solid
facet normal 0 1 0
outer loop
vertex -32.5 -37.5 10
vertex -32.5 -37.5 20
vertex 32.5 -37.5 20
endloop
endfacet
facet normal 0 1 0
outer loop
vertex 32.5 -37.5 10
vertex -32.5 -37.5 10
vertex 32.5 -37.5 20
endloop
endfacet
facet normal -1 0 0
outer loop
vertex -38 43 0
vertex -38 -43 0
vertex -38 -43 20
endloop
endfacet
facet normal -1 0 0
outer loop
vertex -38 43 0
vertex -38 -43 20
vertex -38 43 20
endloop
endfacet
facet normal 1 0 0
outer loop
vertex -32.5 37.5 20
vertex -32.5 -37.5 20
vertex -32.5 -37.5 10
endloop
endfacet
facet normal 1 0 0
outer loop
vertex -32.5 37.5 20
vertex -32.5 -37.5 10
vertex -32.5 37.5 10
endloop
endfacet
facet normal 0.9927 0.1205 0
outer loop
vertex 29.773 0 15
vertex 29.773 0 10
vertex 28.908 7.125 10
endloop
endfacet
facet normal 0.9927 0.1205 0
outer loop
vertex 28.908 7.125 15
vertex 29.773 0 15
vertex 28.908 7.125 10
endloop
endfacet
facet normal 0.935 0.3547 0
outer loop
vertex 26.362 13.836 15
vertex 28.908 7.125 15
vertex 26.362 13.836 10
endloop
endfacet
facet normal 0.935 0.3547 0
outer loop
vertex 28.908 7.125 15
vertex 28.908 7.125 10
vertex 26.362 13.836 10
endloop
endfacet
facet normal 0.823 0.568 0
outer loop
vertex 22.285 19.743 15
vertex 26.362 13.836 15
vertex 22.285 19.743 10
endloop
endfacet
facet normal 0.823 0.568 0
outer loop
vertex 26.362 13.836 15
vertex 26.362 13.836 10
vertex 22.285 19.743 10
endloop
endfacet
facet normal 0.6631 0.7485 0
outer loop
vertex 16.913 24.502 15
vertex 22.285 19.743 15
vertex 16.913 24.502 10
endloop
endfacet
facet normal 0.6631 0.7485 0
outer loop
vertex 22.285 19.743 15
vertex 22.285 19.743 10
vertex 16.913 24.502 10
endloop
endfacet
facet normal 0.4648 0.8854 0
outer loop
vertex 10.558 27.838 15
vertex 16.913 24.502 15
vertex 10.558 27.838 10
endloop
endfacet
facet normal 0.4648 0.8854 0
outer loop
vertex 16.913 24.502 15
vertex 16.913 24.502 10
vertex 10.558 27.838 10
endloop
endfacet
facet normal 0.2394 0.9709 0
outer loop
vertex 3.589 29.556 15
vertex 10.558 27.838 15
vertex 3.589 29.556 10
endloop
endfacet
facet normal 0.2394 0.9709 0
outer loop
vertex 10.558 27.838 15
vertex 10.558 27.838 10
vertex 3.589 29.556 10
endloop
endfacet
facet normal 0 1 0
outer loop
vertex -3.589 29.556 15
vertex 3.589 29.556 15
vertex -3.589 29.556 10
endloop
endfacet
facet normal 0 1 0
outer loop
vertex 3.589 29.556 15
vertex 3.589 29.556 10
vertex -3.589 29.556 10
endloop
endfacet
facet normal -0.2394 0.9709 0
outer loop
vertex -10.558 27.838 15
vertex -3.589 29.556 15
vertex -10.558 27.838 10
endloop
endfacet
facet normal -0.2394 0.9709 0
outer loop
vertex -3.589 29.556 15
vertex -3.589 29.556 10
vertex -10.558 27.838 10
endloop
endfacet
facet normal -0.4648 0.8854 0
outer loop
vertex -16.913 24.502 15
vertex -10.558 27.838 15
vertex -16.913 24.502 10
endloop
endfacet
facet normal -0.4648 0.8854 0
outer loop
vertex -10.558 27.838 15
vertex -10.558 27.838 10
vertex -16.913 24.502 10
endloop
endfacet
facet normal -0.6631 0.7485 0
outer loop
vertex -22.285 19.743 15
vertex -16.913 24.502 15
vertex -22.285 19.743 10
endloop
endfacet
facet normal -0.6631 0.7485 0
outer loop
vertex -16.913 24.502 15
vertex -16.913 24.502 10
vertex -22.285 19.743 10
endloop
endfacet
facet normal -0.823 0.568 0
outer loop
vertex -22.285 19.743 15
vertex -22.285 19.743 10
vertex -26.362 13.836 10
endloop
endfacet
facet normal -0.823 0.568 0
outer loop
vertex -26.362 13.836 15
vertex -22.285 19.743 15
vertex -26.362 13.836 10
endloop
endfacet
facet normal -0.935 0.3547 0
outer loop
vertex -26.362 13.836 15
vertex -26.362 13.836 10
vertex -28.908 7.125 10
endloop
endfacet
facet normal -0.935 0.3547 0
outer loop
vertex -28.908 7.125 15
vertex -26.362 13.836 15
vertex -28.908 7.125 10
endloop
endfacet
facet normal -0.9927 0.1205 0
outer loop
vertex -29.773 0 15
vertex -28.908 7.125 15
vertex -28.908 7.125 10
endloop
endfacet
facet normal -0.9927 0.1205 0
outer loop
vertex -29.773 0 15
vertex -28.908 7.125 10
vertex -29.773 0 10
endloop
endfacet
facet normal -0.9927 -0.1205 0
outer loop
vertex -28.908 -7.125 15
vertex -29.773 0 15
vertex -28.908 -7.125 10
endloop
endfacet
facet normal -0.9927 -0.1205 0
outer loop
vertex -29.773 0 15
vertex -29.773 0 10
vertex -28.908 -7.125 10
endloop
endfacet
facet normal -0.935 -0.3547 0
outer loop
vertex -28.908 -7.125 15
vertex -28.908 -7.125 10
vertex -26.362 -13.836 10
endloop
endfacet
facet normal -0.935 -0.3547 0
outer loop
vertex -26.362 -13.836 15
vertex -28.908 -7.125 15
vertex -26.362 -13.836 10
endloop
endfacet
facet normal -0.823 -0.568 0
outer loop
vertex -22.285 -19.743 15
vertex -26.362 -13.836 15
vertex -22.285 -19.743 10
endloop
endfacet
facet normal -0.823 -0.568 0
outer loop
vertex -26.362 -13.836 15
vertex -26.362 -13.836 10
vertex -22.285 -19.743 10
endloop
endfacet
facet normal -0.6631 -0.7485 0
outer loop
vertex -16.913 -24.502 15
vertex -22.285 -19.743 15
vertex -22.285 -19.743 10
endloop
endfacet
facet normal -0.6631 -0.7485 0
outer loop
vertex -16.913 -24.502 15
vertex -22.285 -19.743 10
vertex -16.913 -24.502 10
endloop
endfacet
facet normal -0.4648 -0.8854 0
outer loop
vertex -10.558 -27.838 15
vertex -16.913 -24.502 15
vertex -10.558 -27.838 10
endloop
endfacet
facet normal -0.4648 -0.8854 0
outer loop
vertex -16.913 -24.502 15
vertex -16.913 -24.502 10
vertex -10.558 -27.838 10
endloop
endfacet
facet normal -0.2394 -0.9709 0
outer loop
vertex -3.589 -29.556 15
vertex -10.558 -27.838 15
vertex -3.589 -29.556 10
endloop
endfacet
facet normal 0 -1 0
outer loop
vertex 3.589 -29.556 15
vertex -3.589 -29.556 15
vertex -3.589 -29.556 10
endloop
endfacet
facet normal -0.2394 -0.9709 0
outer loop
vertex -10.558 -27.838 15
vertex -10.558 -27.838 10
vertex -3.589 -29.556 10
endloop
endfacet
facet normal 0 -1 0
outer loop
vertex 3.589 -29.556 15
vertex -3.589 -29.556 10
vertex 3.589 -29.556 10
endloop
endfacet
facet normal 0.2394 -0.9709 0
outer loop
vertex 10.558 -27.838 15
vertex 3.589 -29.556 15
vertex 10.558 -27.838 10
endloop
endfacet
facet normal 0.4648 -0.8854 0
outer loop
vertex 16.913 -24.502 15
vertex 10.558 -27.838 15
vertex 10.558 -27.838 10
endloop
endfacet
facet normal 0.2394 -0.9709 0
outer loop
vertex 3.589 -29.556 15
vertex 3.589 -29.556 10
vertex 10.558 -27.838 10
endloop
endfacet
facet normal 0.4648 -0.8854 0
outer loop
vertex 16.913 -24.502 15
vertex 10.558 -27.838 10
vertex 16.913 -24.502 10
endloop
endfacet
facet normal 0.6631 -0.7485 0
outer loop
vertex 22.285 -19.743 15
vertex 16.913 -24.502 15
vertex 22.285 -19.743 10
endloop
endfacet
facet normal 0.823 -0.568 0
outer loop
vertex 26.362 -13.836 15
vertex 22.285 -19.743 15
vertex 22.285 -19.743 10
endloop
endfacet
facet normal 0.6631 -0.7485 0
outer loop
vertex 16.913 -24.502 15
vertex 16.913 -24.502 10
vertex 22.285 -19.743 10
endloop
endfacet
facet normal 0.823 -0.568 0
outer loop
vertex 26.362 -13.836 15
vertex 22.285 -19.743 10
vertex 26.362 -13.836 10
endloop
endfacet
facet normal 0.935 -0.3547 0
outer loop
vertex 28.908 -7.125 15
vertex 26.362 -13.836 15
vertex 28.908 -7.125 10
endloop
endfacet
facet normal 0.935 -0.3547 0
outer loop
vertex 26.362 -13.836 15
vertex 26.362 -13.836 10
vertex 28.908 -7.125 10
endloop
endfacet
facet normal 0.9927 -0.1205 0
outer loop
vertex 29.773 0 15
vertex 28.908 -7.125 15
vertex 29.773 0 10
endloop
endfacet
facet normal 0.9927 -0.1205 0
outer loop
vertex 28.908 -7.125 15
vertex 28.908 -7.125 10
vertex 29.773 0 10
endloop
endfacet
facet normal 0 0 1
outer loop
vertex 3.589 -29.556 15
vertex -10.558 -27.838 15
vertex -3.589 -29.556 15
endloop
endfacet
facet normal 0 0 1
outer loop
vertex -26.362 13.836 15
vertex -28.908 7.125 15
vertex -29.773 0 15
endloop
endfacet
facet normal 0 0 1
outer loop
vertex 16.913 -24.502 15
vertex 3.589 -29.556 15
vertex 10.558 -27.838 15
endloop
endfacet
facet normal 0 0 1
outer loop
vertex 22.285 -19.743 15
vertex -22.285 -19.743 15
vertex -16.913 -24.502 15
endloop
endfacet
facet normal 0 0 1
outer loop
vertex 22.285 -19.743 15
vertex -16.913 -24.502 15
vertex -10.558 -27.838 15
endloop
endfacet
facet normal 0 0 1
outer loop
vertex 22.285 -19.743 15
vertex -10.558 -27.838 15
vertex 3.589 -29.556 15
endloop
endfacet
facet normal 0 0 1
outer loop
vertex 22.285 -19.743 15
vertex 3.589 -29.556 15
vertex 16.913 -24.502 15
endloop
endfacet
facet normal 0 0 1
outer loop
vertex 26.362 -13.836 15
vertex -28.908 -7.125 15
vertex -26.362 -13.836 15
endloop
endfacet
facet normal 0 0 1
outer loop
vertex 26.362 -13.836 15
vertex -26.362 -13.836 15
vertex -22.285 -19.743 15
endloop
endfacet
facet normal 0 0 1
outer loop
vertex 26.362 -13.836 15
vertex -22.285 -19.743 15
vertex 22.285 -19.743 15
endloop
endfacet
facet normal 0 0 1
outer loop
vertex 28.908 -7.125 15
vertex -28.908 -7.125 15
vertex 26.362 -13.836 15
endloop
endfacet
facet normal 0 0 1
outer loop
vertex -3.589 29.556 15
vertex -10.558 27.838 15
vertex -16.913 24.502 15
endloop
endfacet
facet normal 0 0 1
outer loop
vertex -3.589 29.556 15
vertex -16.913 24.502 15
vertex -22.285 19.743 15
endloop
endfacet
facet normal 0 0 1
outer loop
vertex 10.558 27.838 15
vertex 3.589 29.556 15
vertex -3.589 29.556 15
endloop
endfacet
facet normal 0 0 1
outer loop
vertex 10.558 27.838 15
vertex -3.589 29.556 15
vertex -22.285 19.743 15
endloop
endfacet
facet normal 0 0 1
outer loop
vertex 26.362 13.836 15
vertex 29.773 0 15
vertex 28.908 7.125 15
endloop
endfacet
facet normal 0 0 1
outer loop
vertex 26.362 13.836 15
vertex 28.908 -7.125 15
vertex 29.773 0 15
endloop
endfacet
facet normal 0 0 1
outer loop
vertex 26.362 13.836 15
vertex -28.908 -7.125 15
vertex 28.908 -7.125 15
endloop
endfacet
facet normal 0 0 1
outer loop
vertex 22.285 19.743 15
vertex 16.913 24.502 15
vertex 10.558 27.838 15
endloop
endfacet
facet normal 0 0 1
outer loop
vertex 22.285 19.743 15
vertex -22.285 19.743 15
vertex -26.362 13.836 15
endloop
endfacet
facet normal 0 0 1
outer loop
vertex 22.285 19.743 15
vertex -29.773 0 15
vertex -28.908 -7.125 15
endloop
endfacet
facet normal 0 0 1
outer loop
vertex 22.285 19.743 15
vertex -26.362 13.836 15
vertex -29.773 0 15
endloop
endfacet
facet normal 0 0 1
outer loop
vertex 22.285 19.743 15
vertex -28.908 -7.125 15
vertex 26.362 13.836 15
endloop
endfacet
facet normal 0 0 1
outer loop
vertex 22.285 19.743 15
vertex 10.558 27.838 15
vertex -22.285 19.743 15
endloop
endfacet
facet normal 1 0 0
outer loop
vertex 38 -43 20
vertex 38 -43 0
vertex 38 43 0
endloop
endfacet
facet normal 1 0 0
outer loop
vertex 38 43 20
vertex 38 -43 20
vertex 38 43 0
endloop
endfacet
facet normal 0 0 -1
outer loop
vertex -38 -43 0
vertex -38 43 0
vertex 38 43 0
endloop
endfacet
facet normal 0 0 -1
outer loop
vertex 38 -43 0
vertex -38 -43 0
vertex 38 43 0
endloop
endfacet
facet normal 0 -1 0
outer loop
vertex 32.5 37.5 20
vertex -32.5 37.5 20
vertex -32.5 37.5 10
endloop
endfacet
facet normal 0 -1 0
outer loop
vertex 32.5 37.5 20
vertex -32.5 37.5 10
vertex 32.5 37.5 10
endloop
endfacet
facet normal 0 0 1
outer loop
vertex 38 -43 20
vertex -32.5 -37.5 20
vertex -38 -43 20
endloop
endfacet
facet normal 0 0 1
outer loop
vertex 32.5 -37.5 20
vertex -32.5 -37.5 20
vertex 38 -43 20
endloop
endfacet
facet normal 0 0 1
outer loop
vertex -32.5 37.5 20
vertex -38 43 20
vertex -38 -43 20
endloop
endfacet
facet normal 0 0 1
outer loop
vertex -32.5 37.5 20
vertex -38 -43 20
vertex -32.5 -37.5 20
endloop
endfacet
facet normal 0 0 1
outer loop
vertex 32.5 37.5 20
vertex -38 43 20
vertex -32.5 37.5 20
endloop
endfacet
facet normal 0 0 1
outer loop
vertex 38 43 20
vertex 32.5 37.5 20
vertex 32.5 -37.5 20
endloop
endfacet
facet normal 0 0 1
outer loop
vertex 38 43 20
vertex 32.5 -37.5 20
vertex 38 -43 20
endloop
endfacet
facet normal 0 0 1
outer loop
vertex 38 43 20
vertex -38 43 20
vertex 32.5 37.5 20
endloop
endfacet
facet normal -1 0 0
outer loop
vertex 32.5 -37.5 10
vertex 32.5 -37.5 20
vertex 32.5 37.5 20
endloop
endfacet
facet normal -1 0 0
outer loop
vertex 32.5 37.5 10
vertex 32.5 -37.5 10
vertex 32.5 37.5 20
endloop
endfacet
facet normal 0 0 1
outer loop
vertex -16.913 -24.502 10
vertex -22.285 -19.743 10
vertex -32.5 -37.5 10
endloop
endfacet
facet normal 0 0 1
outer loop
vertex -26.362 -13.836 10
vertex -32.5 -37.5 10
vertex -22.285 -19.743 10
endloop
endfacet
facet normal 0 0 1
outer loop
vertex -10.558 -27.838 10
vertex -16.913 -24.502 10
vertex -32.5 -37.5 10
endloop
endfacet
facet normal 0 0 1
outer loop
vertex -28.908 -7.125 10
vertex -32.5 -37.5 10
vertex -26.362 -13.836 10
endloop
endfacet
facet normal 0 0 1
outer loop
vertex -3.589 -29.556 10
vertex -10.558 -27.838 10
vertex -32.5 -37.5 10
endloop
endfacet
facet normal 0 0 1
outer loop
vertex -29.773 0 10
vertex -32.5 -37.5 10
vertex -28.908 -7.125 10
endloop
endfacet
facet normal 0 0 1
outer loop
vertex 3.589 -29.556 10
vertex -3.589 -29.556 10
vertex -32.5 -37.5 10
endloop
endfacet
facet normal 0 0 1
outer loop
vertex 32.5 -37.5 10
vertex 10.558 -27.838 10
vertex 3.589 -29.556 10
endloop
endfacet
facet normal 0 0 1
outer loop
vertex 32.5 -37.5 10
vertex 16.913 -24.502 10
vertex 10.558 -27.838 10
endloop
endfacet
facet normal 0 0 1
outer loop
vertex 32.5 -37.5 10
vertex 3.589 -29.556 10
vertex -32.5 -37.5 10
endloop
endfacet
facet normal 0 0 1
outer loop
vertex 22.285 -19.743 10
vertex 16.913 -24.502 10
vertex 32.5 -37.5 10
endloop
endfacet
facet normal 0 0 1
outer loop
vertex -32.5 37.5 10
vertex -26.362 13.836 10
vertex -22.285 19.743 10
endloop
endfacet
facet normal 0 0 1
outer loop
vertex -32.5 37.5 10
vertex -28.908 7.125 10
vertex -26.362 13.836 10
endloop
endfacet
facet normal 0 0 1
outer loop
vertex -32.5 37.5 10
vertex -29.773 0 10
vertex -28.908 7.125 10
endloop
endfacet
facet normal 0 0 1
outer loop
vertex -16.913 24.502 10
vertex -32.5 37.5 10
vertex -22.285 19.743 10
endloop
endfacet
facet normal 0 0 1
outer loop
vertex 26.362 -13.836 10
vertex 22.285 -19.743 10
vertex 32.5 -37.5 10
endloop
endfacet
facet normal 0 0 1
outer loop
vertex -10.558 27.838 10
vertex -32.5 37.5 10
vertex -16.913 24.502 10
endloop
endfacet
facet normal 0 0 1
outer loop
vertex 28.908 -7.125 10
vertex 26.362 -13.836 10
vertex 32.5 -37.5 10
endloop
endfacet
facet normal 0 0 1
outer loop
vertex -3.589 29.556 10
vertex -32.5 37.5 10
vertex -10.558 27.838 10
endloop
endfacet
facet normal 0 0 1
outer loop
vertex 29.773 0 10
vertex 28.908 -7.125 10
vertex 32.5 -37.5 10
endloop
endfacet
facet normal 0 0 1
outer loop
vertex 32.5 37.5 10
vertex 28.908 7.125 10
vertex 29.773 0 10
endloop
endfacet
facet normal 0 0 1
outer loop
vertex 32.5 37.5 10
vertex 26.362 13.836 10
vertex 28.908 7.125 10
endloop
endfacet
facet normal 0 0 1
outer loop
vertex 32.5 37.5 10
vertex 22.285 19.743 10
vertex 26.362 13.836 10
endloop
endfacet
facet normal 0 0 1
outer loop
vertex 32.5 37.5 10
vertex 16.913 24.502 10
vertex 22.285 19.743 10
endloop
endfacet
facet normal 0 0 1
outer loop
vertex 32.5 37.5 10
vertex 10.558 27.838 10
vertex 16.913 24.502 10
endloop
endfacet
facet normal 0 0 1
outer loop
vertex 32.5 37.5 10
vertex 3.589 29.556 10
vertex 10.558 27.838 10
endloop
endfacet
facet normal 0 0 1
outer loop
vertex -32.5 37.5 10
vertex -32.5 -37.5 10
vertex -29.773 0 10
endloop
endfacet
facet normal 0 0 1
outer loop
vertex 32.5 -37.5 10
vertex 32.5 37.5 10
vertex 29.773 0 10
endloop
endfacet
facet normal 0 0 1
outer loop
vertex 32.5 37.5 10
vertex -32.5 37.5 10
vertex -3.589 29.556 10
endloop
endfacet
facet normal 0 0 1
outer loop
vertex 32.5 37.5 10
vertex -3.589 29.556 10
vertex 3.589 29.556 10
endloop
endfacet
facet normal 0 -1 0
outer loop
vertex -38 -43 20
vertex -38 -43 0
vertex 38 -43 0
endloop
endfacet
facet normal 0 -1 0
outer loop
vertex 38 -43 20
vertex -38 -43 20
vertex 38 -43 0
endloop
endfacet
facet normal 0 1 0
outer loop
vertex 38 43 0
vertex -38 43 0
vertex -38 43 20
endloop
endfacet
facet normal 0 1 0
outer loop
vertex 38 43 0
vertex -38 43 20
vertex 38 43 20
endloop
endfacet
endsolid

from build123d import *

# Parameters (mm, degrees)
F0_W     = 76
F0_H     = 86
F1_DEPTH = 20
F2_W     = 65
F2_H     = 75
F3_DEPTH = 10
F4_R     = 29.772661
F5_DEPTH = 5


with BuildPart() as f1:
    # F0 (on Top) → F1 (new body)
    with BuildSketch(Plane.XY):
        Rectangle(F0_W, F0_H)
    extrude(amount=F1_DEPTH)

    # F2 (on face) → F3 (cut)
    with BuildSketch(Plane.XY.offset(20)):
        Rectangle(F2_W, F2_H)
    extrude(amount=-F3_DEPTH, mode=Mode.SUBTRACT)

    # F4 (on face) → F5 (join)
    with BuildSketch(Plane.XY.offset(10)):
        Circle(F4_R)
    extrude(amount=F5_DEPTH)


solid = f1.part
